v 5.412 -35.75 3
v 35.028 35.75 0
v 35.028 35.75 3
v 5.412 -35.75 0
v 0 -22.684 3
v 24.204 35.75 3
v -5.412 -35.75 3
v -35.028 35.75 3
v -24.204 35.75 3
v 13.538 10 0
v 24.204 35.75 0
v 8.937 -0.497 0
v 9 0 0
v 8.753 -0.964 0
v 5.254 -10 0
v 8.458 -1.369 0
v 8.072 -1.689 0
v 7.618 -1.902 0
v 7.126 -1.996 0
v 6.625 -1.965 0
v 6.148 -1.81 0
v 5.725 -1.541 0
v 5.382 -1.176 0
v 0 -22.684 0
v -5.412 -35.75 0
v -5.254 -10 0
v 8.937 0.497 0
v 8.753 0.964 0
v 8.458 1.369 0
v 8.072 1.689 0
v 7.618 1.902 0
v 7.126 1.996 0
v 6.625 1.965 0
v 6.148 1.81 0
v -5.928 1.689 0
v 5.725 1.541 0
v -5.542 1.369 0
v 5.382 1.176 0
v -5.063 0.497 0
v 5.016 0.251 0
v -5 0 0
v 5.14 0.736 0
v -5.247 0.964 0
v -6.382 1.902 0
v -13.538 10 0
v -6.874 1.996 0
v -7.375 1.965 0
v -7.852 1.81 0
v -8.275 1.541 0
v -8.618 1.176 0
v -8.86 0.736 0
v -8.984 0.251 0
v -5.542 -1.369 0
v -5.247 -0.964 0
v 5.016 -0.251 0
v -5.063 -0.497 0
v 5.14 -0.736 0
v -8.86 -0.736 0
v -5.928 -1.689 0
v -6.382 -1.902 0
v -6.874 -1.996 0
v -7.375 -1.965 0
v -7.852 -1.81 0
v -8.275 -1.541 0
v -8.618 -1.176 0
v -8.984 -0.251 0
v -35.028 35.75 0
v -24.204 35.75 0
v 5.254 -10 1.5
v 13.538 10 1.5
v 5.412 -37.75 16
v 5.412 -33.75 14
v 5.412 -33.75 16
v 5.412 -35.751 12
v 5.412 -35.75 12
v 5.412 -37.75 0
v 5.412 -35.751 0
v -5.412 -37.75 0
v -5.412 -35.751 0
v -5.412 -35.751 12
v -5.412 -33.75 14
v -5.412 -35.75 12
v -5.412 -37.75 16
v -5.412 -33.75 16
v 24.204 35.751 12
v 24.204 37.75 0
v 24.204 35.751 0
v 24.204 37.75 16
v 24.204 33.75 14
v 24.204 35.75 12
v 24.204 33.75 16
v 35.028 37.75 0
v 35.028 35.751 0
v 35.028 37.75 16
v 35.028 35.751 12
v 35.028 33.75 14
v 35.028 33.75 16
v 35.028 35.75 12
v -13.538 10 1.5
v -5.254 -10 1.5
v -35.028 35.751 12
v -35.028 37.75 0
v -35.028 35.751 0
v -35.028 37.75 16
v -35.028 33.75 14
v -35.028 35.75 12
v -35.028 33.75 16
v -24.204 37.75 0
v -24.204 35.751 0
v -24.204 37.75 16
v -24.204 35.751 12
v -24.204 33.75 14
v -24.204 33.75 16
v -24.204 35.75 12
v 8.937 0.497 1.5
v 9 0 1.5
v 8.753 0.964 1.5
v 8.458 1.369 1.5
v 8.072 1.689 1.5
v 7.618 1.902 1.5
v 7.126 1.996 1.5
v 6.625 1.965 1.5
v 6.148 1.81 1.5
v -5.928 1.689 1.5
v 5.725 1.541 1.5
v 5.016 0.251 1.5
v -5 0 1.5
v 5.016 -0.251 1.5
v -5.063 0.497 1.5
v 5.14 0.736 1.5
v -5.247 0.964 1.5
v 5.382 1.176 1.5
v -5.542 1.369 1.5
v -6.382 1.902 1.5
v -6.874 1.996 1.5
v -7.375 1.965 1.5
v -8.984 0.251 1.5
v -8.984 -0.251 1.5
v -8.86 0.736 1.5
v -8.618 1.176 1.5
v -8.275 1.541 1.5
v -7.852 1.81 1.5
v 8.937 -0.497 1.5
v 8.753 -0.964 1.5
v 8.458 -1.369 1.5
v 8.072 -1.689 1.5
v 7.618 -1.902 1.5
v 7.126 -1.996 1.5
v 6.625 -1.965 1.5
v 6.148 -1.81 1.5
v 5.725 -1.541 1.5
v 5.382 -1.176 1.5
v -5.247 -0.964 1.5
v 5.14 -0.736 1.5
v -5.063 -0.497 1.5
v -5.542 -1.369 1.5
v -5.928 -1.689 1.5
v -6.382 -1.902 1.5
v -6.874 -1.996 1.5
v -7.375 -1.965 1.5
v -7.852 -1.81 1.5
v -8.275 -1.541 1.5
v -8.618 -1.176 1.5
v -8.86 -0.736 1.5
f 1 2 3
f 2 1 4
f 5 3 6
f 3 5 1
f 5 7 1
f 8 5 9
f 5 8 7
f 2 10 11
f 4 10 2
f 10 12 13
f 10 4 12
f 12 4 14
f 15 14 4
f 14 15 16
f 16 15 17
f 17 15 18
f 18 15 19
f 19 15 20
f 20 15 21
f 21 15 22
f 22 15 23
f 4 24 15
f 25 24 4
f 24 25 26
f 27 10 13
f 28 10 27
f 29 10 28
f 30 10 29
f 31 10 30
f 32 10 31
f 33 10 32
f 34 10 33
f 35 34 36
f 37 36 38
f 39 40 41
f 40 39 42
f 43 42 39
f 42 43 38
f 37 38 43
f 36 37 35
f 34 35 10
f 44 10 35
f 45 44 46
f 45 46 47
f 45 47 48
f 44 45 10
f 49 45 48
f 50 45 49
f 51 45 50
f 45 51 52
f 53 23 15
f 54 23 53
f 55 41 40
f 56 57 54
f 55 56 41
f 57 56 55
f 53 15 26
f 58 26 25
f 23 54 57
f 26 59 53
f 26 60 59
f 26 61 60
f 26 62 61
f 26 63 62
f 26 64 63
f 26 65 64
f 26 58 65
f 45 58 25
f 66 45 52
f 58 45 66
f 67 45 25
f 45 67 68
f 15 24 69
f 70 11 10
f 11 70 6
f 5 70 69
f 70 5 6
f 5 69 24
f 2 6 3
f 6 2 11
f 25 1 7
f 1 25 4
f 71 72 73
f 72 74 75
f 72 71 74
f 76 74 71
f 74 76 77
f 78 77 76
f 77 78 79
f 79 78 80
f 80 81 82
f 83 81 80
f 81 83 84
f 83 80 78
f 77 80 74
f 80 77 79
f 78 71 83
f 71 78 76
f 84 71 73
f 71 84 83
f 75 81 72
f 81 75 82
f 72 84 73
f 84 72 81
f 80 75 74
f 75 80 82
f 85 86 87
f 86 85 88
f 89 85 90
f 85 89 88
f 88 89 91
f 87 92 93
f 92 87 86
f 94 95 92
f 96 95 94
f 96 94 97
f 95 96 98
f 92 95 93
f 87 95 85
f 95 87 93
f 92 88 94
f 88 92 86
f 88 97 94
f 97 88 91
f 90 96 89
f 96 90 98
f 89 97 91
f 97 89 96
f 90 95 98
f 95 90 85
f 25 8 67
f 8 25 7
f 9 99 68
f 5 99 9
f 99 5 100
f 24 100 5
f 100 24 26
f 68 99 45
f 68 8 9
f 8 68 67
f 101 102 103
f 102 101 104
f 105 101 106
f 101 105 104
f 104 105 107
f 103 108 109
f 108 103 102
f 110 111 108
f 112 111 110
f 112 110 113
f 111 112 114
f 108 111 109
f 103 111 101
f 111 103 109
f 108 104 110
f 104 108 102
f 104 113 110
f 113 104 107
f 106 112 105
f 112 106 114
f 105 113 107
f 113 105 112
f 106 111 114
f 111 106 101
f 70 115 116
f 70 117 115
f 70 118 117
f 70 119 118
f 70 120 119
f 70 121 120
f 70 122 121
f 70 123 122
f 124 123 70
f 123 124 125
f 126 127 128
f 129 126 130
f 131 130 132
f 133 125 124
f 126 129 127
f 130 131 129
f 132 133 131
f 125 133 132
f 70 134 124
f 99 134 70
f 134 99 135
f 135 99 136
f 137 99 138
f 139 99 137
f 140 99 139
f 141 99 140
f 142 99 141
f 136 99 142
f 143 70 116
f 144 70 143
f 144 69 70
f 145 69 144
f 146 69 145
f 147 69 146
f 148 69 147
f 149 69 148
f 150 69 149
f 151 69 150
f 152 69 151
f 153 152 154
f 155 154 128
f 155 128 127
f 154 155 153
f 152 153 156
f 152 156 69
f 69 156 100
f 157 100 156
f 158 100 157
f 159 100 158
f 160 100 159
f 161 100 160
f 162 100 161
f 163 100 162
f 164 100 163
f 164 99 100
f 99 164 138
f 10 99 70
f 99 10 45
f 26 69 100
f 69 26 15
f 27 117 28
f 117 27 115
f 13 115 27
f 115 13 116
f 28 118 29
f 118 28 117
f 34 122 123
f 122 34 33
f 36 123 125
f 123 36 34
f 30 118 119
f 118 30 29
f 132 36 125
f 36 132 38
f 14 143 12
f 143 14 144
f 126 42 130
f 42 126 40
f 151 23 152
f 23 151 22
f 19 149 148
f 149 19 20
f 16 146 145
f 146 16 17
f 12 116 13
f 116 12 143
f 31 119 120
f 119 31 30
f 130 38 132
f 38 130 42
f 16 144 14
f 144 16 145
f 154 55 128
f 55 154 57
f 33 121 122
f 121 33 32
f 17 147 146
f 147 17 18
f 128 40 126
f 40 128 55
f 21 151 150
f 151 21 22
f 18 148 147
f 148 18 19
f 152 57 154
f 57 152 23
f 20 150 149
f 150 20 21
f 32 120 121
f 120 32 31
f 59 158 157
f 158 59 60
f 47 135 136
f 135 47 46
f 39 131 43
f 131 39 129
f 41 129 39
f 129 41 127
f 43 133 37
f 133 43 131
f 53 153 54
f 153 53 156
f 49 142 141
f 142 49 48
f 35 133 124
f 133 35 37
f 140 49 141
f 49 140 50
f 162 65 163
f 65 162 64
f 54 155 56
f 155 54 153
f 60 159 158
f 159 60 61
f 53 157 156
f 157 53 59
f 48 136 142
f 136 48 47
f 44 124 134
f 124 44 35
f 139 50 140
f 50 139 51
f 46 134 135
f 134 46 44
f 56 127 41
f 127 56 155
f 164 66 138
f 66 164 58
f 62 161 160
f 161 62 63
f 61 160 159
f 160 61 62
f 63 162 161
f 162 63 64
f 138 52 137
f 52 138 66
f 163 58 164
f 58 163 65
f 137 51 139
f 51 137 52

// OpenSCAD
$fn = 25;
epsilon = 0.001; // Used to resolve manifold issues
phone_width = 71.5;
phone_thickness = 11;

clip_thickness = 2;
clip_branch_thickness = 3;
clip_branch_width = 10;
clip_branch_angle = 45;
clip_grip_length = 2;

plate_width = 30;
plate_height = 20;
plate_thickness = 1.5;
plate_holes_distance = 14;
plate_holes_radius = 2;

module drawClipBranch(angle) {
	branch_width = clip_branch_width;
	branch_cut_length = phone_width / cos(angle); // Length of the box once cut
	branch_length = branch_cut_length + abs(clip_branch_width * tan(angle)); // Length of the box prior angles cutting

	branch_x_delta = tan(-angle) * phone_width; // Delta x between top and bottom left-most point
	branch_y_delta = angle > 0 ? sin(-angle) * clip_branch_width : 0;
	branch_grip_width = clip_branch_width / cos(angle);

	bounding_box_width = abs(branch_x_delta) + branch_grip_width;
	bounding_box_height = phone_width;
	bounding_box_thickness = phone_thickness + clip_branch_thickness * 2;

	union() {
		// Skewed branch
		intersection() {
			// Uncut rotated branch
			rotate([0, 0, angle]) 
				translate([0, branch_y_delta, 0])
					cube([branch_width, branch_length, clip_branch_thickness]);
			// Bounding box
			translate([branch_x_delta > 0 ? 0 : branch_x_delta, 0, 0]) 
				cube([bounding_box_width, bounding_box_height, bounding_box_thickness]);
		}
	
		// Bottom grip
		translate([0 , - clip_thickness, 0]) 
			drawClipGrip(branch_grip_width);
	
		// Top grip
		translate([branch_x_delta + branch_grip_width, bounding_box_height + clip_thickness, 0])
			rotate([0, 0, 180])
				drawClipGrip(branch_grip_width);
	}
}

module drawClipGrip(clip_grip_width) {
	clip_grip_height = phone_thickness + clip_branch_thickness;
	clip_grip_thickened_length = clip_grip_length + clip_thickness;

	// Side box
	cube([clip_grip_width, clip_thickness - epsilon, clip_grip_height]);

	// Top box
	translate([0, 0, clip_grip_height - clip_thickness])
	rotate([-90, -180, -90])
	linear_extrude(clip_grip_width) {
		polygon([
			[0, 0],
			[clip_thickness, 0],
			[clip_thickness * 2, clip_thickness],
			[clip_thickness * 2, clip_thickness * 2],
			[0, clip_thickness * 2]
		]);
	}
}

module drawPlate() {
	difference() {
		translate([0, 0, plate_thickness / 2])
			cube([plate_width, plate_height, plate_thickness], true);
		translate([plate_holes_distance / 2, 0, 0])
			cylinder(plate_thickness * 2, plate_holes_radius, plate_holes_radius);
		translate([-plate_holes_distance / 2, 0, 0])
			cylinder(plate_thickness * 2, plate_holes_radius, plate_holes_radius);
	}
}

union() {
	translate([-clip_branch_width / cos(clip_branch_angle / 2) / 2, -phone_width / 2, 0]) {
		drawClipBranch(- clip_branch_angle / 2);
		drawClipBranch(+ clip_branch_angle / 2);
	}
	drawPlate();
}
